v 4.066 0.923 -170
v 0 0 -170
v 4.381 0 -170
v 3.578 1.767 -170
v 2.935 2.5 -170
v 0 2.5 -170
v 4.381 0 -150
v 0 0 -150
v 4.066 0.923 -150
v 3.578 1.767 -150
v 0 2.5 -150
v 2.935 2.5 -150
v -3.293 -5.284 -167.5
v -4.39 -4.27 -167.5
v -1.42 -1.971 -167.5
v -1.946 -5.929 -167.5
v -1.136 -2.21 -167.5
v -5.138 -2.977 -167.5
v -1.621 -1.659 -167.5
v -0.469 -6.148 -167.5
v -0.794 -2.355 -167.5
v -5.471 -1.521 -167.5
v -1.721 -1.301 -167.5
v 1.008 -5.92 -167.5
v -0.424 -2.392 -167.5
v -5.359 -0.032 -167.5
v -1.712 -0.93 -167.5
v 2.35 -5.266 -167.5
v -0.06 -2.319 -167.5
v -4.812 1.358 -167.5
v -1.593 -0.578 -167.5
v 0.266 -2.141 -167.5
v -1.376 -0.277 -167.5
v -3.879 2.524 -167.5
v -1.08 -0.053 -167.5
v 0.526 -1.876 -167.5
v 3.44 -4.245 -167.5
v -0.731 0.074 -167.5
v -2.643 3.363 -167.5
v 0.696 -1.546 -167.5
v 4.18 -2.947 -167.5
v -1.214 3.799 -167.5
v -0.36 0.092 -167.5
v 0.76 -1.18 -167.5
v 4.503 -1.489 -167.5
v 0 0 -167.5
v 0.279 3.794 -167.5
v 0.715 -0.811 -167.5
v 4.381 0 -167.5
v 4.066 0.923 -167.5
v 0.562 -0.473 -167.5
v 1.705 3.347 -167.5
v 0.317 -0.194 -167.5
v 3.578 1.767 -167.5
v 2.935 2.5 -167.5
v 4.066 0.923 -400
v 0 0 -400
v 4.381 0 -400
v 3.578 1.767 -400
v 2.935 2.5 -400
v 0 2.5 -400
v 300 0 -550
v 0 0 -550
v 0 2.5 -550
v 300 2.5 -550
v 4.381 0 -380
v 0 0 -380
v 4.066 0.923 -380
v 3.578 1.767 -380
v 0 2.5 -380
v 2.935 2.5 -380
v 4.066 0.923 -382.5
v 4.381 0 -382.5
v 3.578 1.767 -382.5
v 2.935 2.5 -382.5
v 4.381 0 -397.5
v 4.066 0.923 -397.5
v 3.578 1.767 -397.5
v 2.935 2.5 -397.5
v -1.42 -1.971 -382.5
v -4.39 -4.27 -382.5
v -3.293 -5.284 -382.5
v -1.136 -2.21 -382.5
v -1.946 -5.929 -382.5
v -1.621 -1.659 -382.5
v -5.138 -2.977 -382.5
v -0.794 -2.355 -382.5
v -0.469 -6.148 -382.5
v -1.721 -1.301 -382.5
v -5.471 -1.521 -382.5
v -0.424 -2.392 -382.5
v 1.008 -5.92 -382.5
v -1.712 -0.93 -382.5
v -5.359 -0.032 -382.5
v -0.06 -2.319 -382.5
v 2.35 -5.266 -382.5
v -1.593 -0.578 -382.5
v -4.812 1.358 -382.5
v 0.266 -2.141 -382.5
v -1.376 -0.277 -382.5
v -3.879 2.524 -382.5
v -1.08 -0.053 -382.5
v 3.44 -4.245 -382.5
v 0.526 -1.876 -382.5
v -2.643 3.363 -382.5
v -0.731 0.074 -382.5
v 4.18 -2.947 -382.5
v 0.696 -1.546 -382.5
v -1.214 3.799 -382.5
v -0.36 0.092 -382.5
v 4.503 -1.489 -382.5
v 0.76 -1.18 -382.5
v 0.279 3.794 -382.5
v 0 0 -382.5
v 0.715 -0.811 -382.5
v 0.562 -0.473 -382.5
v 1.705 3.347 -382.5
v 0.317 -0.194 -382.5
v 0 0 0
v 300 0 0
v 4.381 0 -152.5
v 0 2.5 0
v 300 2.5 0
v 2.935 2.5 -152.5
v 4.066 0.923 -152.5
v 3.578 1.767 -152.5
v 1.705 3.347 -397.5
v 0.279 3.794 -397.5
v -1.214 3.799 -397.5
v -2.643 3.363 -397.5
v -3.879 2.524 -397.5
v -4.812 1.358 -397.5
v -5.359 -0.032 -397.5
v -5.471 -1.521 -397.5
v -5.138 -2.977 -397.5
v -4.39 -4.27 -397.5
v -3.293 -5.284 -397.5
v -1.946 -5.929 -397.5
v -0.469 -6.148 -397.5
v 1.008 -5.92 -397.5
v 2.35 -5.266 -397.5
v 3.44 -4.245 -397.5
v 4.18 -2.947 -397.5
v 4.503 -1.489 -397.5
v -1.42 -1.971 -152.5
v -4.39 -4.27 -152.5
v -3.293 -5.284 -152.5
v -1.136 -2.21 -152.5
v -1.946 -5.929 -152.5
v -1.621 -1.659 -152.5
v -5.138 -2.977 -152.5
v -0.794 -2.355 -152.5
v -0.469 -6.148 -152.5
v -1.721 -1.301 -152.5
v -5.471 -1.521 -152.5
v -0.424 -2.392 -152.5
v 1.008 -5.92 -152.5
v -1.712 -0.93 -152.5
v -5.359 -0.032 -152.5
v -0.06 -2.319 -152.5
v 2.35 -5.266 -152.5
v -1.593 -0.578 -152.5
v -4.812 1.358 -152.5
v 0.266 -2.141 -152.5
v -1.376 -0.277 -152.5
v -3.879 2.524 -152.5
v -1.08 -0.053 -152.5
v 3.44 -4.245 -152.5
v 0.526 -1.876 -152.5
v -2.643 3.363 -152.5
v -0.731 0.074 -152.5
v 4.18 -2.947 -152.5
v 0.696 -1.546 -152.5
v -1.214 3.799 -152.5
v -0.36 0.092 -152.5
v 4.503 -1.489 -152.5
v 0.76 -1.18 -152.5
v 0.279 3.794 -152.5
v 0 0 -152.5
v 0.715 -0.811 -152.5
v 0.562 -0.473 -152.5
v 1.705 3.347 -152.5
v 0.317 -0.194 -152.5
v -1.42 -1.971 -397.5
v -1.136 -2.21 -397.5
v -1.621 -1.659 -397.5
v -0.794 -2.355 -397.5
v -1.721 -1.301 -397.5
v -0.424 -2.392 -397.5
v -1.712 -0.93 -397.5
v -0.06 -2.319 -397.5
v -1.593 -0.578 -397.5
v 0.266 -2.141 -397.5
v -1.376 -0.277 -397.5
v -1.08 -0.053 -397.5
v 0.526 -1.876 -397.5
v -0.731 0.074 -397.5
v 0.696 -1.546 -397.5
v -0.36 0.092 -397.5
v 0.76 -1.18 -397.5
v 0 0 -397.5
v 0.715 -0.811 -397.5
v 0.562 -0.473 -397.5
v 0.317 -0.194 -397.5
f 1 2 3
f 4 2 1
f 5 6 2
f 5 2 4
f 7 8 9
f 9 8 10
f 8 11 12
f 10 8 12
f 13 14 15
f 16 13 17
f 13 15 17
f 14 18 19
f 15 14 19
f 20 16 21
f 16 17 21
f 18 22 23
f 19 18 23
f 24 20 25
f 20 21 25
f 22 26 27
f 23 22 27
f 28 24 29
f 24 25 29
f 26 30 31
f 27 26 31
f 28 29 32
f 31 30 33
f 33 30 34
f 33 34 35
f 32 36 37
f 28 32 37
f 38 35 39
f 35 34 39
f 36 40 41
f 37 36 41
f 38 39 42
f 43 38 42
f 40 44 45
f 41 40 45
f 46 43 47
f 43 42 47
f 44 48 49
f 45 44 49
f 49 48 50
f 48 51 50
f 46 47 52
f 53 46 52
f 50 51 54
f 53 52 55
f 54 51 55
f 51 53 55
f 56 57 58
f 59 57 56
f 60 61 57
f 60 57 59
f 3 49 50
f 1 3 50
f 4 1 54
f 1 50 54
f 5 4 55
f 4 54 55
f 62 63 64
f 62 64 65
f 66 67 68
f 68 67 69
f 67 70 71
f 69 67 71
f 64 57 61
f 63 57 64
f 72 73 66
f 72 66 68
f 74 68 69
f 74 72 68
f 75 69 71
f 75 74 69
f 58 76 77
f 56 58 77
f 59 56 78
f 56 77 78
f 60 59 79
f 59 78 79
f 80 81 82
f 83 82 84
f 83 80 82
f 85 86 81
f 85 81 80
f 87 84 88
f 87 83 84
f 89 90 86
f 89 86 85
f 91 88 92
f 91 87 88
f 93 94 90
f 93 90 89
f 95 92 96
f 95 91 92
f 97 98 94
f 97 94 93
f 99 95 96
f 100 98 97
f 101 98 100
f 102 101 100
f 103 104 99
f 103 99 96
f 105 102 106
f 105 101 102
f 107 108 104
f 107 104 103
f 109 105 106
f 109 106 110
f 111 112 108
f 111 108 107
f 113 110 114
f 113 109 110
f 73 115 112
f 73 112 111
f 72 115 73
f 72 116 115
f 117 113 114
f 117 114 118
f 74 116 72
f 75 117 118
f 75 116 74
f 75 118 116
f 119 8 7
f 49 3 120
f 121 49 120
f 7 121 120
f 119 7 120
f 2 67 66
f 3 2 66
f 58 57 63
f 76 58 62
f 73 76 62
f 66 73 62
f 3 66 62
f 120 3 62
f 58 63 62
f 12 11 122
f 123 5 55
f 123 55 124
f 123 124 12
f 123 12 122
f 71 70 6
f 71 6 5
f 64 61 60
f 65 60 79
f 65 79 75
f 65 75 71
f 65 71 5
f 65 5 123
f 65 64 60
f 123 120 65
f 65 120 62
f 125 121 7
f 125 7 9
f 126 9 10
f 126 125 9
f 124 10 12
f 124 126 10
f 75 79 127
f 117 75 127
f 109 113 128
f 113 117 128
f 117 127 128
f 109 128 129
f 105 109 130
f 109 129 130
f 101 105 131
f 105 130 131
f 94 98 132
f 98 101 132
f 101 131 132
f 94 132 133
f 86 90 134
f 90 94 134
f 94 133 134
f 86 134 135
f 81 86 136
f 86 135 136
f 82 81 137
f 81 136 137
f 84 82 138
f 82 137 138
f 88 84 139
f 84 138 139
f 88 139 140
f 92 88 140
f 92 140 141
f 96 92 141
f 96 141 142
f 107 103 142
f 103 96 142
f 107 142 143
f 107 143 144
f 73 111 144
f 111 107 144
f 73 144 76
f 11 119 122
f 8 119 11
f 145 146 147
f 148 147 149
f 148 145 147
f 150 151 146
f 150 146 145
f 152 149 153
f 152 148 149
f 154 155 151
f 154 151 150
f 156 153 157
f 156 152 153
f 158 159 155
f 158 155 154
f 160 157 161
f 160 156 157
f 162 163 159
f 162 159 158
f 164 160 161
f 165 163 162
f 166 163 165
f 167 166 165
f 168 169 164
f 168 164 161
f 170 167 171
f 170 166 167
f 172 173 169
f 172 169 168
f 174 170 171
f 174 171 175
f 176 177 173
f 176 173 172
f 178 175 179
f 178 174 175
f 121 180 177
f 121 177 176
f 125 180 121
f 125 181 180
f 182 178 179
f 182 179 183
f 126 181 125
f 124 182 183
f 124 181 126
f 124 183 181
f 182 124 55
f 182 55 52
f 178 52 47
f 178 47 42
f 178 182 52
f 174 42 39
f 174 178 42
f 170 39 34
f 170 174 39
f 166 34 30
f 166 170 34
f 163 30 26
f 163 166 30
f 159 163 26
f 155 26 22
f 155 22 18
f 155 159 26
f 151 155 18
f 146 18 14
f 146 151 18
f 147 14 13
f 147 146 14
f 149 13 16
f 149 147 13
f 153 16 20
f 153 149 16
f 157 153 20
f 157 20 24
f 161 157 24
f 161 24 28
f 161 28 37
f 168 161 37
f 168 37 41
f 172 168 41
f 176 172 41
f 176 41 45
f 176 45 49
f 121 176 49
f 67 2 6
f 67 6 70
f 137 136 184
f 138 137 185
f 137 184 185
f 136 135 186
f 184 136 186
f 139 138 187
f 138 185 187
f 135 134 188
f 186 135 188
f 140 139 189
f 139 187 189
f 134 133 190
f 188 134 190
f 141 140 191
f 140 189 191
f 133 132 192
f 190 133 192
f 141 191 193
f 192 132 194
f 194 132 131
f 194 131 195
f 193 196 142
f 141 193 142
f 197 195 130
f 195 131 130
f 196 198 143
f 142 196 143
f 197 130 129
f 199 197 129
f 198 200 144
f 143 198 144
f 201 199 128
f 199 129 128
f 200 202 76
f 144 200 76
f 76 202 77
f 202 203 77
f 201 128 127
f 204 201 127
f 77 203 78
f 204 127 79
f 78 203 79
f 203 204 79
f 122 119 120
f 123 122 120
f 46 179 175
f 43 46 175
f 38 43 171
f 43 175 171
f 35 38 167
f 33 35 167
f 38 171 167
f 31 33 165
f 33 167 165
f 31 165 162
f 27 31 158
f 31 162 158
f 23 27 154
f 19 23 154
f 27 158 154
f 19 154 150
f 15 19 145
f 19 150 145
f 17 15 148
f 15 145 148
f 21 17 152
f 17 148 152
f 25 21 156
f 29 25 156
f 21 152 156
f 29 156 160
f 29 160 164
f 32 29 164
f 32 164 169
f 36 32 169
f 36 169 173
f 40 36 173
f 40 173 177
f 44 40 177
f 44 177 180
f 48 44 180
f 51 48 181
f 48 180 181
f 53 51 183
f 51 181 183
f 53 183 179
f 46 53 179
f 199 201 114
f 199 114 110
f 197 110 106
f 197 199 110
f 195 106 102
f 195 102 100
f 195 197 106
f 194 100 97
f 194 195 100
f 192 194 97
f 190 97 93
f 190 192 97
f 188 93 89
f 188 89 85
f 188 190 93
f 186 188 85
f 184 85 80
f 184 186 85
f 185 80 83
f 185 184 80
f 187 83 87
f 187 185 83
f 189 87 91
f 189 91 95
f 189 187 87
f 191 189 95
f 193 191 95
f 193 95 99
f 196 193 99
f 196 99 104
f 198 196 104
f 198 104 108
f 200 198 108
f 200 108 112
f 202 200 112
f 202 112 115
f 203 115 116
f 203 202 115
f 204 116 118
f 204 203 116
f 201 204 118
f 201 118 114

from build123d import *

# Parameters (mm, degrees)
SKETCH1_W               = 300
SKETCH1_H               = 550
BOSS_EXTRUDE1_DEPTH     = 2.5
SKETCH3_R               = 5
SKETCH3_R_2             = 1.245895
BOSS_EXTRUDE2_DEPTH     = 15
SKETCH4_R               = 5
CUT_EXTRUDE1_DEPTH      = 2.5
MIRROR3_COPY_1_SKETCH_R = 5
MIRROR3_COPY_1_DEPTH    = 2.5
MIRROR3_COPY_2_SKETCH_R = 5
MIRROR3_COPY_2_DEPTH    = 2.5


with BuildPart() as part:
    # Sketch1 → Boss-Extrude1 (new body)
    with BuildSketch(Plane(origin=(0, 0, 0), x_dir=(1, 0, 0), z_dir=(0, 1, 0))):
        with Locations((150, 275)):
            Rectangle(SKETCH1_W, SKETCH1_H)
    extrude(amount=BOSS_EXTRUDE1_DEPTH)

    # Sketch3 → Boss-Extrude2 (add)
    with BuildSketch(Plane.XY.offset(-152.5)):
        with Locations((-0.485034728, -1.147604315)):
            Circle(SKETCH3_R)
        with Locations((-0.485034728, -1.147604315)):
            Circle(SKETCH3_R_2, mode=Mode.SUBTRACT)
    boss_extrude2 = extrude(amount=-BOSS_EXTRUDE2_DEPTH)

    # Mirror1: Boss-Extrude2 across plane
    add(boss_extrude2.mirror(Plane.XY.offset(-275)))

    # Sketch4 → Cut-Extrude1 (cut)
    with BuildSketch(Plane.XY.offset(-152.5)):
        with Locations((-0.485034728, -1.147604315)):
            Circle(SKETCH4_R)
    cut_extrude1 = extrude(amount=CUT_EXTRUDE1_DEPTH, mode=Mode.SUBTRACT)

    # Mirror2: Cut-Extrude1 across plane
    add(cut_extrude1.mirror(Plane.XY.offset(-160)), mode=Mode.SUBTRACT)

    # Mirror3 copy 1 sketch → Mirror3 copy 1 (cut)
    with BuildSketch(Plane.XY.offset(-382.5)):
        with Locations((-0.485034728, -1.147604315)):
            Circle(MIRROR3_COPY_1_SKETCH_R)
    extrude(amount=MIRROR3_COPY_1_DEPTH, mode=Mode.SUBTRACT)

    # Mirror3 copy 2 sketch → Mirror3 copy 2 (cut)
    with BuildSketch(Plane(origin=(0, 0, -397.5), x_dir=(1, 0, 0), z_dir=(0, 0, -1))):
        with Locations((-0.485034728, 1.147604315)):
            Circle(MIRROR3_COPY_2_SKETCH_R)
    extrude(amount=MIRROR3_COPY_2_DEPTH, mode=Mode.SUBTRACT)


solid = part.part
